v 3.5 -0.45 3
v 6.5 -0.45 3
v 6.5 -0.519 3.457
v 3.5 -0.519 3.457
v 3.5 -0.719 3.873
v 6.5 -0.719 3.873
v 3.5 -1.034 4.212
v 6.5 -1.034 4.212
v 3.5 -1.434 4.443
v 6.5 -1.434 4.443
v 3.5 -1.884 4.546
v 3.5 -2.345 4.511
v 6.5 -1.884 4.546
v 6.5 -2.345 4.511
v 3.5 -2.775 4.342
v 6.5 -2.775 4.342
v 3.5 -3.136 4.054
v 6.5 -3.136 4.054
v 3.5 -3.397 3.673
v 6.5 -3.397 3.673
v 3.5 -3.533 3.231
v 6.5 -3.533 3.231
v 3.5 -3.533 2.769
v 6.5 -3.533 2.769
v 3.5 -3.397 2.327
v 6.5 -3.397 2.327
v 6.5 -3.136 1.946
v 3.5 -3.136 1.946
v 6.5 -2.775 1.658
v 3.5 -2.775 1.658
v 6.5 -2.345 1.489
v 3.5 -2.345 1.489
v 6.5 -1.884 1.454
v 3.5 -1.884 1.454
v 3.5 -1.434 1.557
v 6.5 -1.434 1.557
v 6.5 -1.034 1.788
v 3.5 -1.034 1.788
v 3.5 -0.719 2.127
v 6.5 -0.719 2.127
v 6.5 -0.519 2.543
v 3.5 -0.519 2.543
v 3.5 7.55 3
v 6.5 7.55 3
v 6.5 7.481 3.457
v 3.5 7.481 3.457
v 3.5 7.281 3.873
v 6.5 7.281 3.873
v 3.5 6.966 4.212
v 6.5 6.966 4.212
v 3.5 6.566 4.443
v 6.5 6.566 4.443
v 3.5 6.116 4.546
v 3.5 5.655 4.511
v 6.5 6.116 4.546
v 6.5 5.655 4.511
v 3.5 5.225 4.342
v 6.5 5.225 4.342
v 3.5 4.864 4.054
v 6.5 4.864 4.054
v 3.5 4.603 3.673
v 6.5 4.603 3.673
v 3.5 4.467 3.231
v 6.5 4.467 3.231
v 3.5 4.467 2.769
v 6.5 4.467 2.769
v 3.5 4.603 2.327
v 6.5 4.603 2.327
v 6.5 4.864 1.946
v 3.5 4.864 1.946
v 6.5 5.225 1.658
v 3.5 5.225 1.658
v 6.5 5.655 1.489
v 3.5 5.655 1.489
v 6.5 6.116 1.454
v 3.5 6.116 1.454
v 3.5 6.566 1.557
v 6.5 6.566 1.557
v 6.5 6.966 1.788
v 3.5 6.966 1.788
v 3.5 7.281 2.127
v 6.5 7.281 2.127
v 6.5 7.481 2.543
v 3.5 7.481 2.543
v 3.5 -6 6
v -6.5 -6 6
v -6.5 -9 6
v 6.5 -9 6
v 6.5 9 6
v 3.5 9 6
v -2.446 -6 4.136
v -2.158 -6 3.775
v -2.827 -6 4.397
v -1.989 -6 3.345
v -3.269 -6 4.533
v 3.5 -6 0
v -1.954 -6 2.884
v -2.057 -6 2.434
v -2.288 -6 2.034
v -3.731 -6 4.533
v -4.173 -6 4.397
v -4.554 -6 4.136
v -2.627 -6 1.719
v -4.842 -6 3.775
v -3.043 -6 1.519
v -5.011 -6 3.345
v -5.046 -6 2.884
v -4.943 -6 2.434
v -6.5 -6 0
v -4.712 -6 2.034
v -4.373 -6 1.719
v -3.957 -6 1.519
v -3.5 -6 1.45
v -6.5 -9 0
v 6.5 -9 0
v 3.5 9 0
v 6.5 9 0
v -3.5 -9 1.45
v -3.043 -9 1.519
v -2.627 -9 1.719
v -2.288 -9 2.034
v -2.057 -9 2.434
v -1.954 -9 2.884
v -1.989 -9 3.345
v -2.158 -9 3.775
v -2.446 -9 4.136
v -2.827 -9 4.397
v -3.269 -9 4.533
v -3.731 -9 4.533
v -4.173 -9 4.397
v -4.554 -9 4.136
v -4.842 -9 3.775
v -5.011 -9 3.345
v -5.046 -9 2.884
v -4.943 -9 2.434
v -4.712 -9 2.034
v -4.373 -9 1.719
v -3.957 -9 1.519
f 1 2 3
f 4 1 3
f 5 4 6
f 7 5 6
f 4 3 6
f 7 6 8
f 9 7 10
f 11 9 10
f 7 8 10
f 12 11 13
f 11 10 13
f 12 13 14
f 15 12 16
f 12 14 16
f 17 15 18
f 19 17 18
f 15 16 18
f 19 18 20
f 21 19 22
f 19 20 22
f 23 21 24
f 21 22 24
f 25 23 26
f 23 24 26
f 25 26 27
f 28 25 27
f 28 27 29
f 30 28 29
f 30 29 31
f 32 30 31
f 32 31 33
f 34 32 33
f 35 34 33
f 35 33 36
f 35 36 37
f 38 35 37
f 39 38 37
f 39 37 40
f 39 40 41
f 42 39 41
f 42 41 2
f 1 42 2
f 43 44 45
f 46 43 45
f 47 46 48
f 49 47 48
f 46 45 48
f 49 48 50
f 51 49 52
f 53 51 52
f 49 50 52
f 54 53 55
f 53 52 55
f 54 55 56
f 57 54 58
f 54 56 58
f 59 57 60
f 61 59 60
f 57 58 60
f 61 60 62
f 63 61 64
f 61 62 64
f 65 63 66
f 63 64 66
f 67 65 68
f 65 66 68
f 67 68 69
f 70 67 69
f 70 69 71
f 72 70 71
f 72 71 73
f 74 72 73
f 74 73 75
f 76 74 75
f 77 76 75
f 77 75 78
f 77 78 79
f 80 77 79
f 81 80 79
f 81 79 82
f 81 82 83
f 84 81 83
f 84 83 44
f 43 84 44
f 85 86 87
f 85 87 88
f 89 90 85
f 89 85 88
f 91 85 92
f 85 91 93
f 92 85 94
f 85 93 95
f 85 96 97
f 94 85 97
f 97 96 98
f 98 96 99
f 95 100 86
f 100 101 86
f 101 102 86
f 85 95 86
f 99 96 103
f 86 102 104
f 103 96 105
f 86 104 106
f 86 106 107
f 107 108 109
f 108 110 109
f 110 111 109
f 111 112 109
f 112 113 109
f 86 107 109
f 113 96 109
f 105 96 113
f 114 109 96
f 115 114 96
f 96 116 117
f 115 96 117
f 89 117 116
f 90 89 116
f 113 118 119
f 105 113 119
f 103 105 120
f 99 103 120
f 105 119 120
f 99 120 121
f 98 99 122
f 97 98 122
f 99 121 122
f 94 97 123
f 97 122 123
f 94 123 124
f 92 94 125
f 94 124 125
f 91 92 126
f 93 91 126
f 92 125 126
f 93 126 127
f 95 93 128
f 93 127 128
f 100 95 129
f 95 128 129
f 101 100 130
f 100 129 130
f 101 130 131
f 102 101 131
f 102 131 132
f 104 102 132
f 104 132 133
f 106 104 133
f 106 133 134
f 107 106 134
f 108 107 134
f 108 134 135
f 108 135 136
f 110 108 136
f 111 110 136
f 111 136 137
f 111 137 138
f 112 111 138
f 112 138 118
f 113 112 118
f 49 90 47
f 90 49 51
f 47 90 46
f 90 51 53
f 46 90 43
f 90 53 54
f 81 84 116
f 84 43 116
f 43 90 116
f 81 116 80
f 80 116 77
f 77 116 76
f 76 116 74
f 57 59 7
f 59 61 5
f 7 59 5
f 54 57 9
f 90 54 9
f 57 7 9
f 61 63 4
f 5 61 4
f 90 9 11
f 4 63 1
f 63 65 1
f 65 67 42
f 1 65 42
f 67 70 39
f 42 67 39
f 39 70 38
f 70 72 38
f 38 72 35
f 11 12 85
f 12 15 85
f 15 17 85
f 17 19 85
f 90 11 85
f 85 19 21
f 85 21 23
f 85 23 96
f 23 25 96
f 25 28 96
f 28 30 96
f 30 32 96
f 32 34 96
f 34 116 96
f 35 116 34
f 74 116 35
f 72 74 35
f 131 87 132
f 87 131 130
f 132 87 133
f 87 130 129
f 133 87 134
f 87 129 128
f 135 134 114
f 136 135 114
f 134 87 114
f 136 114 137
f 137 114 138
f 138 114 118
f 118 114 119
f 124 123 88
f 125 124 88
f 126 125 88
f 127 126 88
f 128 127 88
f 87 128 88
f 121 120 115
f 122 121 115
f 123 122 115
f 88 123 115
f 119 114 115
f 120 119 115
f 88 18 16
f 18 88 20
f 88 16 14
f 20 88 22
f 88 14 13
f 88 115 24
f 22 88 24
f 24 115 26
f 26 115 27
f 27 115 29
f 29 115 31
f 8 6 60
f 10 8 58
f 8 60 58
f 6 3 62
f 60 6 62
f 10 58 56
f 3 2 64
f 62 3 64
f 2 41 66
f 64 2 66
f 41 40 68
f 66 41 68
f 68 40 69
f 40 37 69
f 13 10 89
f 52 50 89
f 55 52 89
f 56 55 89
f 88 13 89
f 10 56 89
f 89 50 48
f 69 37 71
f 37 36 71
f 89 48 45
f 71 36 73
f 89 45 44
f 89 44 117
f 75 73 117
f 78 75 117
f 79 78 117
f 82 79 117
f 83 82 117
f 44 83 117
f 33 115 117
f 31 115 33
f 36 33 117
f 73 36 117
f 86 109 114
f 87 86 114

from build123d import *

# Parameters (mm, degrees)
BOSS_EXTRUDE1_DEPTH = 6
SKETCH3_R           = 1.55
CUT_EXTRUDE1_DEPTH  = 17.911534525
SKETCH5_R           = 1.55
CUT_EXTRUDE2_DEPTH  = 21.05617112


with BuildPart() as part:
    # Sketch1 → Boss-Extrude1 (new body)
    with BuildSketch(Plane.XY):
        Polygon((3.5, -6), (0.5, -6), (-6.5, -6), (-6.5, -9), (6.5, -9), (6.5, 9), (3.5, 9), (3.5, -4.7), align=None)
    extrude(amount=BOSS_EXTRUDE1_DEPTH)

    # Sketch3 → Cut-Extrude1 (cut, through all)
    with BuildSketch(Plane(origin=(6.5, 0, 0), x_dir=(0, 0, -1), z_dir=(1, 0, 0))):
        with Locations(Location((-3, 6, 0), (0, 0, 90))):
            Circle(SKETCH3_R)
        with Locations(Location((-3, -2, 0), (0, 0, 90))):
            Circle(SKETCH3_R)
    extrude(amount=-CUT_EXTRUDE1_DEPTH, mode=Mode.SUBTRACT)

    # Sketch5 → Cut-Extrude2 (cut, through all)
    with BuildSketch(Plane.XZ.offset(9)):
        with Locations(Location((-3.5, 3, 0), (0, 0, 270))):
            Circle(SKETCH5_R)
    extrude(amount=-CUT_EXTRUDE2_DEPTH, mode=Mode.SUBTRACT)


solid = part.part
